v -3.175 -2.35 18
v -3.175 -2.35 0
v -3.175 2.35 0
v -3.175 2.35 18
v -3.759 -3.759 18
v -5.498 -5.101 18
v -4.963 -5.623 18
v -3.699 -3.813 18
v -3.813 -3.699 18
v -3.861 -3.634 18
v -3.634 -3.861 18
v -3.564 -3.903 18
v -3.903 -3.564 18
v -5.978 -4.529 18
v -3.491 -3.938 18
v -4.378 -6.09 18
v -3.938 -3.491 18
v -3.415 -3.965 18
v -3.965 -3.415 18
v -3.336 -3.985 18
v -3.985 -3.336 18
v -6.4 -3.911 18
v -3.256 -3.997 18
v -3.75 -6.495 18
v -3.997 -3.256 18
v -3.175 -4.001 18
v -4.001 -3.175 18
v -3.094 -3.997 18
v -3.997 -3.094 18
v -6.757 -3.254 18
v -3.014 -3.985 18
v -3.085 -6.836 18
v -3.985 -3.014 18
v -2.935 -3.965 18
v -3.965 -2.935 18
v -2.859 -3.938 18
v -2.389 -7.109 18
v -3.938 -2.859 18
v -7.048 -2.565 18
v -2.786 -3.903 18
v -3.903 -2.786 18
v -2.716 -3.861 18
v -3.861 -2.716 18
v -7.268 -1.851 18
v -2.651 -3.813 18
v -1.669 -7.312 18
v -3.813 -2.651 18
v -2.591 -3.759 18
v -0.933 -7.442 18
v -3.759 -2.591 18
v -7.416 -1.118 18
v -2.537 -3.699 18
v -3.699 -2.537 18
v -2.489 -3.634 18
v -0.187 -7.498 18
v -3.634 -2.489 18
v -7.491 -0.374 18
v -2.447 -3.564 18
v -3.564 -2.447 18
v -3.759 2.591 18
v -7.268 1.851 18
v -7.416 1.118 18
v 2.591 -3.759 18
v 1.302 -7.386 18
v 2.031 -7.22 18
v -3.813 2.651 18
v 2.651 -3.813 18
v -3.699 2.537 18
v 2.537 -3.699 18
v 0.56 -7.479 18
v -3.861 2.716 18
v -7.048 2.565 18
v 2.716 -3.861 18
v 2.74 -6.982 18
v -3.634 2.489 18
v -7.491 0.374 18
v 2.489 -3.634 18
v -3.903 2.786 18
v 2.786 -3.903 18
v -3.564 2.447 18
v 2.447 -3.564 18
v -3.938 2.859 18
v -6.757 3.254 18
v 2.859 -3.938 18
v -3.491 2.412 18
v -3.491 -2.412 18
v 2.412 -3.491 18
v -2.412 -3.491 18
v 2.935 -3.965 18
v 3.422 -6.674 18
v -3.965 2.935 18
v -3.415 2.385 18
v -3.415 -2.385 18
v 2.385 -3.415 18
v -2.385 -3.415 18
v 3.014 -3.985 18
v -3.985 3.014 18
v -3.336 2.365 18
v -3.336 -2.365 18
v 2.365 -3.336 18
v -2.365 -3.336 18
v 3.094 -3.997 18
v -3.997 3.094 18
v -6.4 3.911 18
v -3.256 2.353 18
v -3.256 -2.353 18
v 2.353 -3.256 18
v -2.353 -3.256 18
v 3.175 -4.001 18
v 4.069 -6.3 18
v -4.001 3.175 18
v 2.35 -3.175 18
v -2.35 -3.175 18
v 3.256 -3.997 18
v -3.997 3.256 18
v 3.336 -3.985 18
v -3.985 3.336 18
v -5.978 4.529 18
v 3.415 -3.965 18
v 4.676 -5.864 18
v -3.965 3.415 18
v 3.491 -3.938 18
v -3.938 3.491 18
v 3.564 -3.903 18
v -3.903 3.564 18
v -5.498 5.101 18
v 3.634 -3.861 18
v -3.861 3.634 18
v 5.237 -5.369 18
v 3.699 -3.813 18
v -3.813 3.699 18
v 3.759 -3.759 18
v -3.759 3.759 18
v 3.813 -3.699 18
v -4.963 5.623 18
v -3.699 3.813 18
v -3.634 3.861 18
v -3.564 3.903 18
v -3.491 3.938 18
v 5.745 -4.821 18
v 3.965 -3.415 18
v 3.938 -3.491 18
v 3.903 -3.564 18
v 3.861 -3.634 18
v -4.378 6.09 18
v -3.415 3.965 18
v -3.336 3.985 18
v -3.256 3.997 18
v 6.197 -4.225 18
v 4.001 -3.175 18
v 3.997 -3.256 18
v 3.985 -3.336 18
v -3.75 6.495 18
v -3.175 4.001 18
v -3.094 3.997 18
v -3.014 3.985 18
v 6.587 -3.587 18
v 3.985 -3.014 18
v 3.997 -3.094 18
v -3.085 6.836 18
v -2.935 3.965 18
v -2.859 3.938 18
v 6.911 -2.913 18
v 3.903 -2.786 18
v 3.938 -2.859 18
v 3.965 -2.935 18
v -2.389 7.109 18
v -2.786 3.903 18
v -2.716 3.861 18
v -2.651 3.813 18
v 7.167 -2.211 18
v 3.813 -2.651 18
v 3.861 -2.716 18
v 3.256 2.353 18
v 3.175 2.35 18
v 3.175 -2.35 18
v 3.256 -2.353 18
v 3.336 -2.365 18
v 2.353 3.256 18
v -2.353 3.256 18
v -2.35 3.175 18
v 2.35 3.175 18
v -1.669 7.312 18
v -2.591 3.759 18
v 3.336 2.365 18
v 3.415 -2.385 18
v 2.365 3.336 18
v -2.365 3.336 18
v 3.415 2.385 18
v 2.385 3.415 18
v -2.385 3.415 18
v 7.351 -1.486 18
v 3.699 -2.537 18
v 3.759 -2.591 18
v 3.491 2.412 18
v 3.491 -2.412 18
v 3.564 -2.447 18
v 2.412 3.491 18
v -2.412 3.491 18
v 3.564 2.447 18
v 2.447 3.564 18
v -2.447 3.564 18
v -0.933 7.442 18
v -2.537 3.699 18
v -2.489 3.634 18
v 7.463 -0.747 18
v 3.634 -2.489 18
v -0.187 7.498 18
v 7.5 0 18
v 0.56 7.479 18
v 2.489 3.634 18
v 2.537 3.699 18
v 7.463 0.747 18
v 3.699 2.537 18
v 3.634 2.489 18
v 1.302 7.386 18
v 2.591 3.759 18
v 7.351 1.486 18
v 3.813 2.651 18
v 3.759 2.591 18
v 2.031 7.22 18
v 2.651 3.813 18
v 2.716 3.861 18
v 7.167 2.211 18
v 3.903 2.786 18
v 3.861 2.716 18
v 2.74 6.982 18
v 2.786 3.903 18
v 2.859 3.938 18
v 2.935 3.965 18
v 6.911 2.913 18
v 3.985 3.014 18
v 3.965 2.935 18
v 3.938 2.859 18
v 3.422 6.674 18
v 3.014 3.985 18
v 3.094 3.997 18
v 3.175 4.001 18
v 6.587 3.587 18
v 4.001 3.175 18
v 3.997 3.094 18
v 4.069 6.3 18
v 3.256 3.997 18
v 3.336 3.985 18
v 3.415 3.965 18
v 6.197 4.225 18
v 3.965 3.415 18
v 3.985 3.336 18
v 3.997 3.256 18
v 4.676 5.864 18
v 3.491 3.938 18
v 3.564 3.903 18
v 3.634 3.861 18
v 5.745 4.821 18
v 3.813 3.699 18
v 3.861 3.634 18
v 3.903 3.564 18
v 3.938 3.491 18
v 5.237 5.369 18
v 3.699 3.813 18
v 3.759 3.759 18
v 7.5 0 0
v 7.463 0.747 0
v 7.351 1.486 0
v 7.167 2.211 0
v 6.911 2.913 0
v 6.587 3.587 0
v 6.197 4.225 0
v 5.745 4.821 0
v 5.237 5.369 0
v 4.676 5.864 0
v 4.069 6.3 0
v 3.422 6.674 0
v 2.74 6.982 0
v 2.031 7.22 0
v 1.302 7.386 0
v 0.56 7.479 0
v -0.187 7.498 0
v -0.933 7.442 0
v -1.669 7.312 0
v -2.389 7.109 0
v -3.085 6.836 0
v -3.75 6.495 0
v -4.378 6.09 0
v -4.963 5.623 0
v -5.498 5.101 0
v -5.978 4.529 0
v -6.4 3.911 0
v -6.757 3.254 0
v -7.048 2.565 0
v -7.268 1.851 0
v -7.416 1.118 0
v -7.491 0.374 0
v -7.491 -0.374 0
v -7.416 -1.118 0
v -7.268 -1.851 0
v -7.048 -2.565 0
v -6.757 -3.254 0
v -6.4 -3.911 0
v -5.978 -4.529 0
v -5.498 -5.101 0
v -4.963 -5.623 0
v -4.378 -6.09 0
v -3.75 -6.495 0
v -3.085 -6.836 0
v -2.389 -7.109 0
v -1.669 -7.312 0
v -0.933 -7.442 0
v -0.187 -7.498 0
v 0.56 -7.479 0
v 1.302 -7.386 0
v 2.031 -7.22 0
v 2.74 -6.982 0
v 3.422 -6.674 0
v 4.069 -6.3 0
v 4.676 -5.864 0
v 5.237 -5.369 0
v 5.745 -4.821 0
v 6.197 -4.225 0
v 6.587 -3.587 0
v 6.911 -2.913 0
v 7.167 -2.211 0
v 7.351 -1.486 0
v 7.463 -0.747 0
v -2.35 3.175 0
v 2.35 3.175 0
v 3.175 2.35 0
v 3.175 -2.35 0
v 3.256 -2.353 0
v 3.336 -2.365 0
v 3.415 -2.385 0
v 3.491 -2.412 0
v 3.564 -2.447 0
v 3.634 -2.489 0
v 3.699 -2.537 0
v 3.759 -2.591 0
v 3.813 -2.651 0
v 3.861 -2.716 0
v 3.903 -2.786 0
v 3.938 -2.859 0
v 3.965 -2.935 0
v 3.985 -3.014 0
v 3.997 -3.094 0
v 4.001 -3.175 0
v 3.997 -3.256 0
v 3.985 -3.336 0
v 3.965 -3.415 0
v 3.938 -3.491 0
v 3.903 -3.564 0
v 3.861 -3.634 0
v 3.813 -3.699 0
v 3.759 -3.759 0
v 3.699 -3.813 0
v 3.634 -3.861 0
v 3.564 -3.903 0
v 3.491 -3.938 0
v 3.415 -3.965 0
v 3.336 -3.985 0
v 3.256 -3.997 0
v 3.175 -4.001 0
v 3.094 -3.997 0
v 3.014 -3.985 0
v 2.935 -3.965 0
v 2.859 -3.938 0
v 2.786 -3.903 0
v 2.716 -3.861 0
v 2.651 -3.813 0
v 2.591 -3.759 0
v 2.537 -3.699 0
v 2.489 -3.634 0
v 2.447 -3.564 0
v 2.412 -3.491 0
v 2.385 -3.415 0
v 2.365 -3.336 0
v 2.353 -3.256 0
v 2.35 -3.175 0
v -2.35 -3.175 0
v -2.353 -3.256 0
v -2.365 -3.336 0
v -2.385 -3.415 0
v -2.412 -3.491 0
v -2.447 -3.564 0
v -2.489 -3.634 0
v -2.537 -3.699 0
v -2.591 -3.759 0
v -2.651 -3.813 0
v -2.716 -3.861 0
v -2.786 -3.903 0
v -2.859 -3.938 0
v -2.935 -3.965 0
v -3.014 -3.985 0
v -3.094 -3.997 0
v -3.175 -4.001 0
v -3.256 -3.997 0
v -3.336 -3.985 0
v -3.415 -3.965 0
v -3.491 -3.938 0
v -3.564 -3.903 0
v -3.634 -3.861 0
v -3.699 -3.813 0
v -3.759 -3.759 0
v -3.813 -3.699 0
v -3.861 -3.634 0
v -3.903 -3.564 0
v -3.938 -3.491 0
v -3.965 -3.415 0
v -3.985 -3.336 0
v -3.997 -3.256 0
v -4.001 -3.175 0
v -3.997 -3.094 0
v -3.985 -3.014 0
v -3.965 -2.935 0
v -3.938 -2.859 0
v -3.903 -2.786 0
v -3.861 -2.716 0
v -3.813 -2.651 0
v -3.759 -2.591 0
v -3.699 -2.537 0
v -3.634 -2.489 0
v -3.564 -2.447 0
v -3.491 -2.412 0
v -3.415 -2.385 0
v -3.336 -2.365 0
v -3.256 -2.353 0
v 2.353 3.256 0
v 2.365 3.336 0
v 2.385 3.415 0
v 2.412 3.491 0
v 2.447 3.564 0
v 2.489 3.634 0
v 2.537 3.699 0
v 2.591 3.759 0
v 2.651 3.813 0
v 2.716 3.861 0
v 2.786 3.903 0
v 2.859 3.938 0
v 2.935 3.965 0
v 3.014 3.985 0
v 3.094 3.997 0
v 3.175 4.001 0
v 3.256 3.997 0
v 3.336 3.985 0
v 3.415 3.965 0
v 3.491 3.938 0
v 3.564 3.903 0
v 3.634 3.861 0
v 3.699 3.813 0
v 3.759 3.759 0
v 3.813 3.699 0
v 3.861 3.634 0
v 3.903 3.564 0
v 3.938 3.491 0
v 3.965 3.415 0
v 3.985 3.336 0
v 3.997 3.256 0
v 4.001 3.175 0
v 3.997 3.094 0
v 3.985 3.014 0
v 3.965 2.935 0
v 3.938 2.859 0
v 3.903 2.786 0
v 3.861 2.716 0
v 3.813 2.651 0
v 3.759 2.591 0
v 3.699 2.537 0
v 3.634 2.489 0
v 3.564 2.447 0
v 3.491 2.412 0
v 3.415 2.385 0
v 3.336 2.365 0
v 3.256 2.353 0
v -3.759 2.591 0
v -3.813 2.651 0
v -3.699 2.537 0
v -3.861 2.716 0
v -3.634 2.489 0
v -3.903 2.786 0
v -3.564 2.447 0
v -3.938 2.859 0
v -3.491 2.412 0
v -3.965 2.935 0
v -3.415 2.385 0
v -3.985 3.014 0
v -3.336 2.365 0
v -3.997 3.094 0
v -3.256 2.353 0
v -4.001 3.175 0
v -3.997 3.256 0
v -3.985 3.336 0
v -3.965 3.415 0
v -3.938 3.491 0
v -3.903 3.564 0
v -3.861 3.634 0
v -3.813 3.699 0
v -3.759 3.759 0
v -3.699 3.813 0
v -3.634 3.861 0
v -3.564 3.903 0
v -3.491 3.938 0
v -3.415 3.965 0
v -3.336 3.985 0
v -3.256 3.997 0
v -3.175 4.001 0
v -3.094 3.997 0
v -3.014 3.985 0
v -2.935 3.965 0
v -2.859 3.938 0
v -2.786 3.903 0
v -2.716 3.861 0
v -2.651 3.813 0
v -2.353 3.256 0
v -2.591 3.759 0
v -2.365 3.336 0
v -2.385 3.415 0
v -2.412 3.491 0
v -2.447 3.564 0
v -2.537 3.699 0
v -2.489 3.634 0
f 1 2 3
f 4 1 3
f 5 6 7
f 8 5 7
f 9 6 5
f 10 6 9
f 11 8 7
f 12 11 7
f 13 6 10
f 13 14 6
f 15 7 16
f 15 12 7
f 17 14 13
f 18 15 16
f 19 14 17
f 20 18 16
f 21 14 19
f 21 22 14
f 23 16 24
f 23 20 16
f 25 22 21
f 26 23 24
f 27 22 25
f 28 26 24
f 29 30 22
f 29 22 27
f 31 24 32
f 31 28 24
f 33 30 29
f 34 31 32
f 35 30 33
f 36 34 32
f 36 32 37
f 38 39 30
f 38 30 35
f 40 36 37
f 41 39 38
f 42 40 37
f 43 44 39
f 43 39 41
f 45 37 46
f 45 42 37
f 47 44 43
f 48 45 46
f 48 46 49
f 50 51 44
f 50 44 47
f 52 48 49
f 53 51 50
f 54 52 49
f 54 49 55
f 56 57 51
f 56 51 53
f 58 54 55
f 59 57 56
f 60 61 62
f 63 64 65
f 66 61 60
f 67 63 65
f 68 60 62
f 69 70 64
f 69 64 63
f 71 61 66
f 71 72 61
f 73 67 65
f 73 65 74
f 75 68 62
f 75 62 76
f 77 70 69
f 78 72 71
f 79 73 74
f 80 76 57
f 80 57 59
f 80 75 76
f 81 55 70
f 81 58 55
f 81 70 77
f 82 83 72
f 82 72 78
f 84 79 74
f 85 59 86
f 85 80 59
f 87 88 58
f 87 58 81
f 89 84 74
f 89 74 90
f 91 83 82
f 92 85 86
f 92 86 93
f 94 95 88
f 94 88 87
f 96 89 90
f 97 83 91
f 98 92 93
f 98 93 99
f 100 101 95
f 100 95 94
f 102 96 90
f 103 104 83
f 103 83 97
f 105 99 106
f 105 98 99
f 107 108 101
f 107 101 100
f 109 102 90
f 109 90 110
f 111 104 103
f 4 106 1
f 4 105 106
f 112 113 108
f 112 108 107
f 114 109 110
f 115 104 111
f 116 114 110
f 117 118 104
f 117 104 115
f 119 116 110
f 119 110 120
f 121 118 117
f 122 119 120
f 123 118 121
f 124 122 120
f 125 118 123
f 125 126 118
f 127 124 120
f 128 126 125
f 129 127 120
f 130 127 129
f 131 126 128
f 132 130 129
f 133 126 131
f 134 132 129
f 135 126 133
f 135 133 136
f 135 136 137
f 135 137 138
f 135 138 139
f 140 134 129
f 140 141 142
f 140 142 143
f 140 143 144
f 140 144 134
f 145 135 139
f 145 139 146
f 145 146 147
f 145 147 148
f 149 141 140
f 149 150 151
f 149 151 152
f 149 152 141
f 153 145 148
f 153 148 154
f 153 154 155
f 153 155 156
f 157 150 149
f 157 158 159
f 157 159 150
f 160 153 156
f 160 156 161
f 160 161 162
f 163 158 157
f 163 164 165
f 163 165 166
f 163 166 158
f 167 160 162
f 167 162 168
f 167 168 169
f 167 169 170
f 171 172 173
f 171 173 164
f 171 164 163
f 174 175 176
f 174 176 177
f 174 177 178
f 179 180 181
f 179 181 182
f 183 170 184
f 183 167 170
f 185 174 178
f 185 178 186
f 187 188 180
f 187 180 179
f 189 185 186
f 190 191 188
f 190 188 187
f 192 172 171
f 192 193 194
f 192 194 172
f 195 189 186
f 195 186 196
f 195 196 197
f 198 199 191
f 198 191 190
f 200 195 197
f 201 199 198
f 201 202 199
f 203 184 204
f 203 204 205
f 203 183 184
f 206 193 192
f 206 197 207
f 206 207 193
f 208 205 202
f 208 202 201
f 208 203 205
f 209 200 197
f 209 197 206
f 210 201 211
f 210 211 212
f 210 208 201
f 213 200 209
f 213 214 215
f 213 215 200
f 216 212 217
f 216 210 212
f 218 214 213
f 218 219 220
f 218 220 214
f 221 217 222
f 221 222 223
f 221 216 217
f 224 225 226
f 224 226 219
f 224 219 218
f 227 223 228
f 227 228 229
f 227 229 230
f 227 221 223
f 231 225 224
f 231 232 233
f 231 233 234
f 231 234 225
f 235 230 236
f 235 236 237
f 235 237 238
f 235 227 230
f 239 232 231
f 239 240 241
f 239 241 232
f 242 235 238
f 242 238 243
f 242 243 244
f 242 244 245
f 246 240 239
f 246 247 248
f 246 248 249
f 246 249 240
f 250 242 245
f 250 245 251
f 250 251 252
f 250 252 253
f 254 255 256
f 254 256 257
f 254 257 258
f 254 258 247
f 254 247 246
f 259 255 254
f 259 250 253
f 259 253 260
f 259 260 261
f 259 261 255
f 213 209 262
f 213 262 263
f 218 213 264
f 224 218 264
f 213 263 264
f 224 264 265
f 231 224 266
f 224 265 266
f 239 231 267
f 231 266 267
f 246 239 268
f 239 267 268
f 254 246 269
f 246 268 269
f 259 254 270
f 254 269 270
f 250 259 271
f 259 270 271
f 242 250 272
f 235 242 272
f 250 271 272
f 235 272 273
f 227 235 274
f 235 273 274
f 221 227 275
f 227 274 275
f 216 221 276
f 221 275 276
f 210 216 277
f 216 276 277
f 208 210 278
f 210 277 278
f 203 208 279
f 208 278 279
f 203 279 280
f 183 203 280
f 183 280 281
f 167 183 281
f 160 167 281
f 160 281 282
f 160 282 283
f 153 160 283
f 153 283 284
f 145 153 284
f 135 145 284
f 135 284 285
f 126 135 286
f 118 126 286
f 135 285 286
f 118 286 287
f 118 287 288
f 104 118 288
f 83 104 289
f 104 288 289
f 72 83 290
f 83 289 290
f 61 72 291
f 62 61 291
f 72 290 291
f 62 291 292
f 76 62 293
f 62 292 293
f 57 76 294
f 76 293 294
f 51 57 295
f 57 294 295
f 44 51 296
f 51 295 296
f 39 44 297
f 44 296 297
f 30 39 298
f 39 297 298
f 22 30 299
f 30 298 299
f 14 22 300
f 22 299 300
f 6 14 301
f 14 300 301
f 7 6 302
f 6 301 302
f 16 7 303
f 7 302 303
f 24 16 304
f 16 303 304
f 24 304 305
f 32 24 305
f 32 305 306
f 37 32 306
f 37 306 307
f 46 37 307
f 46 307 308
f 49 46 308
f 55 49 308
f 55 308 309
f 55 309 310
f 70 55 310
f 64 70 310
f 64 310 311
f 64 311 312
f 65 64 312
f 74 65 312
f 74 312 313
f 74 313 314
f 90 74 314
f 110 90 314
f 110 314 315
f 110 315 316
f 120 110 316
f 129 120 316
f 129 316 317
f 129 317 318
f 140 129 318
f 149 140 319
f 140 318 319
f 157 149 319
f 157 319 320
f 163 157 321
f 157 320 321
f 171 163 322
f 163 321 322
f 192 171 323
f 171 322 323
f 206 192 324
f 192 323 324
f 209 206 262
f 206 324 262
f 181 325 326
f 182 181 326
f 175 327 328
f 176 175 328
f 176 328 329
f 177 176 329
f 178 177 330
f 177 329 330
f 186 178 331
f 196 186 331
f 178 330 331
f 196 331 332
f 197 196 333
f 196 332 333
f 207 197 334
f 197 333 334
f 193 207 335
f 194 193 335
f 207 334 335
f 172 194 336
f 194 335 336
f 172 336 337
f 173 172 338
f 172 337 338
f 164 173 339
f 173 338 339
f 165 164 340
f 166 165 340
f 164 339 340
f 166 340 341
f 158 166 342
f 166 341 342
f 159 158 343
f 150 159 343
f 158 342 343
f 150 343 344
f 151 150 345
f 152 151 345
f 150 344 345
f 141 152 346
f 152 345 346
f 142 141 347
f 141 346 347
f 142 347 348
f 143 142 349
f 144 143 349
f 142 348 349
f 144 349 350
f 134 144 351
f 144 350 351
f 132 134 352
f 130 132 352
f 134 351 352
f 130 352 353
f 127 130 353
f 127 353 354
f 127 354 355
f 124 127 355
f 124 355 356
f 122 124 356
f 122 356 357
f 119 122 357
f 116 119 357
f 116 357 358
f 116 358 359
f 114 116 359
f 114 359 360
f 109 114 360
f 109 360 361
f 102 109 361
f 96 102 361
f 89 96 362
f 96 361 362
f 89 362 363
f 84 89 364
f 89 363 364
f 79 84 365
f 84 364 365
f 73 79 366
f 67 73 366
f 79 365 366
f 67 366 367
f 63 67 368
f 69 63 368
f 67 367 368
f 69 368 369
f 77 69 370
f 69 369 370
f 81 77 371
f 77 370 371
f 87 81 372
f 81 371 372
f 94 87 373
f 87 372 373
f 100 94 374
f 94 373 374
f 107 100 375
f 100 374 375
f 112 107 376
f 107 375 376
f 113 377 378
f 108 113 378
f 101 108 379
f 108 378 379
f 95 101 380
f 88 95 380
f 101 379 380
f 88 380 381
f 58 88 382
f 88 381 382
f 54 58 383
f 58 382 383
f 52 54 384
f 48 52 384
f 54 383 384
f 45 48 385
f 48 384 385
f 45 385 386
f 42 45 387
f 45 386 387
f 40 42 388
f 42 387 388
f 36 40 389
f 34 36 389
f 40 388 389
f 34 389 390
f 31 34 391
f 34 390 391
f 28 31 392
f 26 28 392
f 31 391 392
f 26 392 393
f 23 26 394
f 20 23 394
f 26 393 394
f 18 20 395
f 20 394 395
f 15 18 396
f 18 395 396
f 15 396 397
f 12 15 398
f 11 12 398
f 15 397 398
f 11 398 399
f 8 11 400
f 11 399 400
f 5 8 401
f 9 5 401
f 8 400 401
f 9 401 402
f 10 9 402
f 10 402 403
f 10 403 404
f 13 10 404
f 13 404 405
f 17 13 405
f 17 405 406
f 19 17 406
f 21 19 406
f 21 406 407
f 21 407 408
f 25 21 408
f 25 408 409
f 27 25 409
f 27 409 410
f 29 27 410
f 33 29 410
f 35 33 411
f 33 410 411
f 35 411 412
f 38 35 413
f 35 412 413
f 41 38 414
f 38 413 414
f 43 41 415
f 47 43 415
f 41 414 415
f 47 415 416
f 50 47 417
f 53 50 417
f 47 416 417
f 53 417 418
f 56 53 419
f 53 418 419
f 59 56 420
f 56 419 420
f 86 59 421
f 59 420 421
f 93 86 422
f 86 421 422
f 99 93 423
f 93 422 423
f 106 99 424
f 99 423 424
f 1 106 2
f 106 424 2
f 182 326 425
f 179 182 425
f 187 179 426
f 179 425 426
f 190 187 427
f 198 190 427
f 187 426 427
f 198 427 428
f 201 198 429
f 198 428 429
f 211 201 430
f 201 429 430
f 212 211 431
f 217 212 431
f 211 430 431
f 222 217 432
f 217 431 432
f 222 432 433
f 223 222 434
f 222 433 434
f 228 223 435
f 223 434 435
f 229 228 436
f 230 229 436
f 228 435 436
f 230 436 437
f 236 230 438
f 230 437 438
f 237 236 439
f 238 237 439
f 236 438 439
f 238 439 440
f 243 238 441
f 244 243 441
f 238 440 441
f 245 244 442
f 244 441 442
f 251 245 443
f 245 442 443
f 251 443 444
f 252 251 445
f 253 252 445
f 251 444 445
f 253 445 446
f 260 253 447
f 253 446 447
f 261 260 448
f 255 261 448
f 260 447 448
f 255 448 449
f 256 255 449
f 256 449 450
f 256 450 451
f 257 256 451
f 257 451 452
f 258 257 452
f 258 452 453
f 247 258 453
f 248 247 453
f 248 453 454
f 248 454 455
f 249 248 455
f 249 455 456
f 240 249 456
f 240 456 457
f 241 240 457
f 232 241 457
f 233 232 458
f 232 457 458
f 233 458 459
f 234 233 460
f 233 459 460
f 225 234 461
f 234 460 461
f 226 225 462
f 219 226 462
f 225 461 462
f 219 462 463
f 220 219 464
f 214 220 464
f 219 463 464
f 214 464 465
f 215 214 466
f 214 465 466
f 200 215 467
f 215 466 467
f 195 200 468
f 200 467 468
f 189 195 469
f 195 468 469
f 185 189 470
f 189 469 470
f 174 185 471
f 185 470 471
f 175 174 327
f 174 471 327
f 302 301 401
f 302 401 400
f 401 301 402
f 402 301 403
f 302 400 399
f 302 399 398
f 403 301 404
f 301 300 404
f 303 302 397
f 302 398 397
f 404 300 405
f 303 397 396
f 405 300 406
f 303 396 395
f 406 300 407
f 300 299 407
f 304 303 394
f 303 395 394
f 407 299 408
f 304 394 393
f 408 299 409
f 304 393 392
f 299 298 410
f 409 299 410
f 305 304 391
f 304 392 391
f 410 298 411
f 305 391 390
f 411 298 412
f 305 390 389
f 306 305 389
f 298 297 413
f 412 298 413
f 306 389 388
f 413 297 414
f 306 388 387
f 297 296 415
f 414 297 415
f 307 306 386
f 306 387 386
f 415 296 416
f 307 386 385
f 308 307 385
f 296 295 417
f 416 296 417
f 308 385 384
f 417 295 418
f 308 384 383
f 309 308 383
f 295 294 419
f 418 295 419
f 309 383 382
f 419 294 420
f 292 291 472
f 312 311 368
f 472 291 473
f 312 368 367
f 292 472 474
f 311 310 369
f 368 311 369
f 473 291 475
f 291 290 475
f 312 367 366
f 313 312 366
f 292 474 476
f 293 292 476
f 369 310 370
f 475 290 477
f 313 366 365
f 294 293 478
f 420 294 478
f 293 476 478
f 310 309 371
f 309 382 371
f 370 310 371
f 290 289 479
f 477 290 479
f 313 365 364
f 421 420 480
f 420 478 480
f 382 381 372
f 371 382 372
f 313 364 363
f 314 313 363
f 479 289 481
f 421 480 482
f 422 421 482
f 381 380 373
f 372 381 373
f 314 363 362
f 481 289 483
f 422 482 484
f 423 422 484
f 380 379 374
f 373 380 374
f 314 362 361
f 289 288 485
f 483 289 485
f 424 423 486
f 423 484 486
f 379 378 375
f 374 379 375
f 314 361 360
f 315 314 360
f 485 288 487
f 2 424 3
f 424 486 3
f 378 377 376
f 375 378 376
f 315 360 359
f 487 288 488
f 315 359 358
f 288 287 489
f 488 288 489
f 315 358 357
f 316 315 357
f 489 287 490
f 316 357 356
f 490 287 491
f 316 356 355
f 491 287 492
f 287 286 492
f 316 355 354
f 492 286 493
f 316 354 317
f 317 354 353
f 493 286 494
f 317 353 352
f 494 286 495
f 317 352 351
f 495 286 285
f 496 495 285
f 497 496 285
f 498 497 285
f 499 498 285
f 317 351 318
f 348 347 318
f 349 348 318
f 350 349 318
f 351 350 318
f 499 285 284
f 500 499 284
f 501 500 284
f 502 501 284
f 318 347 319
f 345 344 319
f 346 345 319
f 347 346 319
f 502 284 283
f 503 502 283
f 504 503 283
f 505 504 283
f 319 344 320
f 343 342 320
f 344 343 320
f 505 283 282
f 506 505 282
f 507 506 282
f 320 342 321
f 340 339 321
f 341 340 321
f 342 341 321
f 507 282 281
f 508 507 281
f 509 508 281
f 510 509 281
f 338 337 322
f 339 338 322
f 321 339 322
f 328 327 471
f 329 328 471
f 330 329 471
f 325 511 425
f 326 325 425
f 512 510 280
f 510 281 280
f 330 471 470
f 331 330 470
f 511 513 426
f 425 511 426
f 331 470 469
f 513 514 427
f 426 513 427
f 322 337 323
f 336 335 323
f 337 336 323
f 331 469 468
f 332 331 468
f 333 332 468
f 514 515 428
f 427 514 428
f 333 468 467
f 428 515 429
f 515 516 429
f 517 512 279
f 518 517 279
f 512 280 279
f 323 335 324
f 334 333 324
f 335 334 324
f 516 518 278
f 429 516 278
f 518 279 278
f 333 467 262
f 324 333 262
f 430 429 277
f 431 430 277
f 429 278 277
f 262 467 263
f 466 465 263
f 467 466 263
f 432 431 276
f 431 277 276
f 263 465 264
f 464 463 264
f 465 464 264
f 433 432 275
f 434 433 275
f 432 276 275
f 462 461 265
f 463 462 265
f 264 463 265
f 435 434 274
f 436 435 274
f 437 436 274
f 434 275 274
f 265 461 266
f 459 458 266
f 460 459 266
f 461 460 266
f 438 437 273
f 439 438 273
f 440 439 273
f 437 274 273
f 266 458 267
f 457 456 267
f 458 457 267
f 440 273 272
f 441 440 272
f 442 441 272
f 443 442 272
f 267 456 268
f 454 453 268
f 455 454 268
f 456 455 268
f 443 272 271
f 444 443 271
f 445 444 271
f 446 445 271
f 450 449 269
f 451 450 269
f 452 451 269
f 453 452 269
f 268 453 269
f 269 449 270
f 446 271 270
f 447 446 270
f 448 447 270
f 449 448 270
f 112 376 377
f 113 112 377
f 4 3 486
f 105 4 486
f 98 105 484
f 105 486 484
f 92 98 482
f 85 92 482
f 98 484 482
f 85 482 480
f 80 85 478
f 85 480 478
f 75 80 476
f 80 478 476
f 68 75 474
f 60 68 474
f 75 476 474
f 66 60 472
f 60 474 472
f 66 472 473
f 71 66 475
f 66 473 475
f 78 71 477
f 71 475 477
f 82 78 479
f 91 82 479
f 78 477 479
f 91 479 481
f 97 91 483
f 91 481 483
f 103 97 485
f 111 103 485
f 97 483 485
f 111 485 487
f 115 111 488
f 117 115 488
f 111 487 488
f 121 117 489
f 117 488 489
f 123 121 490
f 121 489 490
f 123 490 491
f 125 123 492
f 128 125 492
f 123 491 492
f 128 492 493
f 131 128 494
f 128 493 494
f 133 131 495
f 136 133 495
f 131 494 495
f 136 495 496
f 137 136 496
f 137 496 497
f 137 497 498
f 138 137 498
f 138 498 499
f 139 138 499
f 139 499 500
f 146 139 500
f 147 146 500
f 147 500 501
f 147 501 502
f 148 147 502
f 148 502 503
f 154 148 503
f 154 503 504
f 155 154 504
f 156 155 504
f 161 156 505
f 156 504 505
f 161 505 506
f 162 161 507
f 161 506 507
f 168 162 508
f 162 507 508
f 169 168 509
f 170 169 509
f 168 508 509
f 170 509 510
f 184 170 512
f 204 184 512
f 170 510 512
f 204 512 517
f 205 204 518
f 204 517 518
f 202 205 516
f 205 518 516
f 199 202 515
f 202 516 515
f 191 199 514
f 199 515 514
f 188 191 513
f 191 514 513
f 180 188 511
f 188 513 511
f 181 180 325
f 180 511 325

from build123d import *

# Parameters (mm, degrees)
F0_R     = 7.5
F1_DEPTH = 18


with BuildPart() as f1:
    # F0 (on Top) → F1 (new body)
    with BuildSketch(Plane.XY):
        Circle(F0_R)
        with BuildLine():
            ThreePointArc((3.175, -2.3495), (3.758717, -3.758717), (2.3495, -3.175))
            Line((2.3495, -3.175), (-2.3495, -3.175))
            ThreePointArc((-2.3495, -3.175), (-3.758717, -3.758717), (-3.175, -2.3495))
            Line((-3.175, -2.3495), (-3.175, 2.3495))
            ThreePointArc((-3.175, 2.3495), (-3.758717, 3.758717), (-2.3495, 3.175))
            Line((-2.3495, 3.175), (2.3495, 3.175))
            ThreePointArc((2.3495, 3.175), (3.758717, 3.758717), (3.175, 2.3495))
            Line((3.175, 2.3495), (3.175, -2.3495))
        make_face(mode=Mode.SUBTRACT)
    extrude(amount=F1_DEPTH)


solid = f1.part
